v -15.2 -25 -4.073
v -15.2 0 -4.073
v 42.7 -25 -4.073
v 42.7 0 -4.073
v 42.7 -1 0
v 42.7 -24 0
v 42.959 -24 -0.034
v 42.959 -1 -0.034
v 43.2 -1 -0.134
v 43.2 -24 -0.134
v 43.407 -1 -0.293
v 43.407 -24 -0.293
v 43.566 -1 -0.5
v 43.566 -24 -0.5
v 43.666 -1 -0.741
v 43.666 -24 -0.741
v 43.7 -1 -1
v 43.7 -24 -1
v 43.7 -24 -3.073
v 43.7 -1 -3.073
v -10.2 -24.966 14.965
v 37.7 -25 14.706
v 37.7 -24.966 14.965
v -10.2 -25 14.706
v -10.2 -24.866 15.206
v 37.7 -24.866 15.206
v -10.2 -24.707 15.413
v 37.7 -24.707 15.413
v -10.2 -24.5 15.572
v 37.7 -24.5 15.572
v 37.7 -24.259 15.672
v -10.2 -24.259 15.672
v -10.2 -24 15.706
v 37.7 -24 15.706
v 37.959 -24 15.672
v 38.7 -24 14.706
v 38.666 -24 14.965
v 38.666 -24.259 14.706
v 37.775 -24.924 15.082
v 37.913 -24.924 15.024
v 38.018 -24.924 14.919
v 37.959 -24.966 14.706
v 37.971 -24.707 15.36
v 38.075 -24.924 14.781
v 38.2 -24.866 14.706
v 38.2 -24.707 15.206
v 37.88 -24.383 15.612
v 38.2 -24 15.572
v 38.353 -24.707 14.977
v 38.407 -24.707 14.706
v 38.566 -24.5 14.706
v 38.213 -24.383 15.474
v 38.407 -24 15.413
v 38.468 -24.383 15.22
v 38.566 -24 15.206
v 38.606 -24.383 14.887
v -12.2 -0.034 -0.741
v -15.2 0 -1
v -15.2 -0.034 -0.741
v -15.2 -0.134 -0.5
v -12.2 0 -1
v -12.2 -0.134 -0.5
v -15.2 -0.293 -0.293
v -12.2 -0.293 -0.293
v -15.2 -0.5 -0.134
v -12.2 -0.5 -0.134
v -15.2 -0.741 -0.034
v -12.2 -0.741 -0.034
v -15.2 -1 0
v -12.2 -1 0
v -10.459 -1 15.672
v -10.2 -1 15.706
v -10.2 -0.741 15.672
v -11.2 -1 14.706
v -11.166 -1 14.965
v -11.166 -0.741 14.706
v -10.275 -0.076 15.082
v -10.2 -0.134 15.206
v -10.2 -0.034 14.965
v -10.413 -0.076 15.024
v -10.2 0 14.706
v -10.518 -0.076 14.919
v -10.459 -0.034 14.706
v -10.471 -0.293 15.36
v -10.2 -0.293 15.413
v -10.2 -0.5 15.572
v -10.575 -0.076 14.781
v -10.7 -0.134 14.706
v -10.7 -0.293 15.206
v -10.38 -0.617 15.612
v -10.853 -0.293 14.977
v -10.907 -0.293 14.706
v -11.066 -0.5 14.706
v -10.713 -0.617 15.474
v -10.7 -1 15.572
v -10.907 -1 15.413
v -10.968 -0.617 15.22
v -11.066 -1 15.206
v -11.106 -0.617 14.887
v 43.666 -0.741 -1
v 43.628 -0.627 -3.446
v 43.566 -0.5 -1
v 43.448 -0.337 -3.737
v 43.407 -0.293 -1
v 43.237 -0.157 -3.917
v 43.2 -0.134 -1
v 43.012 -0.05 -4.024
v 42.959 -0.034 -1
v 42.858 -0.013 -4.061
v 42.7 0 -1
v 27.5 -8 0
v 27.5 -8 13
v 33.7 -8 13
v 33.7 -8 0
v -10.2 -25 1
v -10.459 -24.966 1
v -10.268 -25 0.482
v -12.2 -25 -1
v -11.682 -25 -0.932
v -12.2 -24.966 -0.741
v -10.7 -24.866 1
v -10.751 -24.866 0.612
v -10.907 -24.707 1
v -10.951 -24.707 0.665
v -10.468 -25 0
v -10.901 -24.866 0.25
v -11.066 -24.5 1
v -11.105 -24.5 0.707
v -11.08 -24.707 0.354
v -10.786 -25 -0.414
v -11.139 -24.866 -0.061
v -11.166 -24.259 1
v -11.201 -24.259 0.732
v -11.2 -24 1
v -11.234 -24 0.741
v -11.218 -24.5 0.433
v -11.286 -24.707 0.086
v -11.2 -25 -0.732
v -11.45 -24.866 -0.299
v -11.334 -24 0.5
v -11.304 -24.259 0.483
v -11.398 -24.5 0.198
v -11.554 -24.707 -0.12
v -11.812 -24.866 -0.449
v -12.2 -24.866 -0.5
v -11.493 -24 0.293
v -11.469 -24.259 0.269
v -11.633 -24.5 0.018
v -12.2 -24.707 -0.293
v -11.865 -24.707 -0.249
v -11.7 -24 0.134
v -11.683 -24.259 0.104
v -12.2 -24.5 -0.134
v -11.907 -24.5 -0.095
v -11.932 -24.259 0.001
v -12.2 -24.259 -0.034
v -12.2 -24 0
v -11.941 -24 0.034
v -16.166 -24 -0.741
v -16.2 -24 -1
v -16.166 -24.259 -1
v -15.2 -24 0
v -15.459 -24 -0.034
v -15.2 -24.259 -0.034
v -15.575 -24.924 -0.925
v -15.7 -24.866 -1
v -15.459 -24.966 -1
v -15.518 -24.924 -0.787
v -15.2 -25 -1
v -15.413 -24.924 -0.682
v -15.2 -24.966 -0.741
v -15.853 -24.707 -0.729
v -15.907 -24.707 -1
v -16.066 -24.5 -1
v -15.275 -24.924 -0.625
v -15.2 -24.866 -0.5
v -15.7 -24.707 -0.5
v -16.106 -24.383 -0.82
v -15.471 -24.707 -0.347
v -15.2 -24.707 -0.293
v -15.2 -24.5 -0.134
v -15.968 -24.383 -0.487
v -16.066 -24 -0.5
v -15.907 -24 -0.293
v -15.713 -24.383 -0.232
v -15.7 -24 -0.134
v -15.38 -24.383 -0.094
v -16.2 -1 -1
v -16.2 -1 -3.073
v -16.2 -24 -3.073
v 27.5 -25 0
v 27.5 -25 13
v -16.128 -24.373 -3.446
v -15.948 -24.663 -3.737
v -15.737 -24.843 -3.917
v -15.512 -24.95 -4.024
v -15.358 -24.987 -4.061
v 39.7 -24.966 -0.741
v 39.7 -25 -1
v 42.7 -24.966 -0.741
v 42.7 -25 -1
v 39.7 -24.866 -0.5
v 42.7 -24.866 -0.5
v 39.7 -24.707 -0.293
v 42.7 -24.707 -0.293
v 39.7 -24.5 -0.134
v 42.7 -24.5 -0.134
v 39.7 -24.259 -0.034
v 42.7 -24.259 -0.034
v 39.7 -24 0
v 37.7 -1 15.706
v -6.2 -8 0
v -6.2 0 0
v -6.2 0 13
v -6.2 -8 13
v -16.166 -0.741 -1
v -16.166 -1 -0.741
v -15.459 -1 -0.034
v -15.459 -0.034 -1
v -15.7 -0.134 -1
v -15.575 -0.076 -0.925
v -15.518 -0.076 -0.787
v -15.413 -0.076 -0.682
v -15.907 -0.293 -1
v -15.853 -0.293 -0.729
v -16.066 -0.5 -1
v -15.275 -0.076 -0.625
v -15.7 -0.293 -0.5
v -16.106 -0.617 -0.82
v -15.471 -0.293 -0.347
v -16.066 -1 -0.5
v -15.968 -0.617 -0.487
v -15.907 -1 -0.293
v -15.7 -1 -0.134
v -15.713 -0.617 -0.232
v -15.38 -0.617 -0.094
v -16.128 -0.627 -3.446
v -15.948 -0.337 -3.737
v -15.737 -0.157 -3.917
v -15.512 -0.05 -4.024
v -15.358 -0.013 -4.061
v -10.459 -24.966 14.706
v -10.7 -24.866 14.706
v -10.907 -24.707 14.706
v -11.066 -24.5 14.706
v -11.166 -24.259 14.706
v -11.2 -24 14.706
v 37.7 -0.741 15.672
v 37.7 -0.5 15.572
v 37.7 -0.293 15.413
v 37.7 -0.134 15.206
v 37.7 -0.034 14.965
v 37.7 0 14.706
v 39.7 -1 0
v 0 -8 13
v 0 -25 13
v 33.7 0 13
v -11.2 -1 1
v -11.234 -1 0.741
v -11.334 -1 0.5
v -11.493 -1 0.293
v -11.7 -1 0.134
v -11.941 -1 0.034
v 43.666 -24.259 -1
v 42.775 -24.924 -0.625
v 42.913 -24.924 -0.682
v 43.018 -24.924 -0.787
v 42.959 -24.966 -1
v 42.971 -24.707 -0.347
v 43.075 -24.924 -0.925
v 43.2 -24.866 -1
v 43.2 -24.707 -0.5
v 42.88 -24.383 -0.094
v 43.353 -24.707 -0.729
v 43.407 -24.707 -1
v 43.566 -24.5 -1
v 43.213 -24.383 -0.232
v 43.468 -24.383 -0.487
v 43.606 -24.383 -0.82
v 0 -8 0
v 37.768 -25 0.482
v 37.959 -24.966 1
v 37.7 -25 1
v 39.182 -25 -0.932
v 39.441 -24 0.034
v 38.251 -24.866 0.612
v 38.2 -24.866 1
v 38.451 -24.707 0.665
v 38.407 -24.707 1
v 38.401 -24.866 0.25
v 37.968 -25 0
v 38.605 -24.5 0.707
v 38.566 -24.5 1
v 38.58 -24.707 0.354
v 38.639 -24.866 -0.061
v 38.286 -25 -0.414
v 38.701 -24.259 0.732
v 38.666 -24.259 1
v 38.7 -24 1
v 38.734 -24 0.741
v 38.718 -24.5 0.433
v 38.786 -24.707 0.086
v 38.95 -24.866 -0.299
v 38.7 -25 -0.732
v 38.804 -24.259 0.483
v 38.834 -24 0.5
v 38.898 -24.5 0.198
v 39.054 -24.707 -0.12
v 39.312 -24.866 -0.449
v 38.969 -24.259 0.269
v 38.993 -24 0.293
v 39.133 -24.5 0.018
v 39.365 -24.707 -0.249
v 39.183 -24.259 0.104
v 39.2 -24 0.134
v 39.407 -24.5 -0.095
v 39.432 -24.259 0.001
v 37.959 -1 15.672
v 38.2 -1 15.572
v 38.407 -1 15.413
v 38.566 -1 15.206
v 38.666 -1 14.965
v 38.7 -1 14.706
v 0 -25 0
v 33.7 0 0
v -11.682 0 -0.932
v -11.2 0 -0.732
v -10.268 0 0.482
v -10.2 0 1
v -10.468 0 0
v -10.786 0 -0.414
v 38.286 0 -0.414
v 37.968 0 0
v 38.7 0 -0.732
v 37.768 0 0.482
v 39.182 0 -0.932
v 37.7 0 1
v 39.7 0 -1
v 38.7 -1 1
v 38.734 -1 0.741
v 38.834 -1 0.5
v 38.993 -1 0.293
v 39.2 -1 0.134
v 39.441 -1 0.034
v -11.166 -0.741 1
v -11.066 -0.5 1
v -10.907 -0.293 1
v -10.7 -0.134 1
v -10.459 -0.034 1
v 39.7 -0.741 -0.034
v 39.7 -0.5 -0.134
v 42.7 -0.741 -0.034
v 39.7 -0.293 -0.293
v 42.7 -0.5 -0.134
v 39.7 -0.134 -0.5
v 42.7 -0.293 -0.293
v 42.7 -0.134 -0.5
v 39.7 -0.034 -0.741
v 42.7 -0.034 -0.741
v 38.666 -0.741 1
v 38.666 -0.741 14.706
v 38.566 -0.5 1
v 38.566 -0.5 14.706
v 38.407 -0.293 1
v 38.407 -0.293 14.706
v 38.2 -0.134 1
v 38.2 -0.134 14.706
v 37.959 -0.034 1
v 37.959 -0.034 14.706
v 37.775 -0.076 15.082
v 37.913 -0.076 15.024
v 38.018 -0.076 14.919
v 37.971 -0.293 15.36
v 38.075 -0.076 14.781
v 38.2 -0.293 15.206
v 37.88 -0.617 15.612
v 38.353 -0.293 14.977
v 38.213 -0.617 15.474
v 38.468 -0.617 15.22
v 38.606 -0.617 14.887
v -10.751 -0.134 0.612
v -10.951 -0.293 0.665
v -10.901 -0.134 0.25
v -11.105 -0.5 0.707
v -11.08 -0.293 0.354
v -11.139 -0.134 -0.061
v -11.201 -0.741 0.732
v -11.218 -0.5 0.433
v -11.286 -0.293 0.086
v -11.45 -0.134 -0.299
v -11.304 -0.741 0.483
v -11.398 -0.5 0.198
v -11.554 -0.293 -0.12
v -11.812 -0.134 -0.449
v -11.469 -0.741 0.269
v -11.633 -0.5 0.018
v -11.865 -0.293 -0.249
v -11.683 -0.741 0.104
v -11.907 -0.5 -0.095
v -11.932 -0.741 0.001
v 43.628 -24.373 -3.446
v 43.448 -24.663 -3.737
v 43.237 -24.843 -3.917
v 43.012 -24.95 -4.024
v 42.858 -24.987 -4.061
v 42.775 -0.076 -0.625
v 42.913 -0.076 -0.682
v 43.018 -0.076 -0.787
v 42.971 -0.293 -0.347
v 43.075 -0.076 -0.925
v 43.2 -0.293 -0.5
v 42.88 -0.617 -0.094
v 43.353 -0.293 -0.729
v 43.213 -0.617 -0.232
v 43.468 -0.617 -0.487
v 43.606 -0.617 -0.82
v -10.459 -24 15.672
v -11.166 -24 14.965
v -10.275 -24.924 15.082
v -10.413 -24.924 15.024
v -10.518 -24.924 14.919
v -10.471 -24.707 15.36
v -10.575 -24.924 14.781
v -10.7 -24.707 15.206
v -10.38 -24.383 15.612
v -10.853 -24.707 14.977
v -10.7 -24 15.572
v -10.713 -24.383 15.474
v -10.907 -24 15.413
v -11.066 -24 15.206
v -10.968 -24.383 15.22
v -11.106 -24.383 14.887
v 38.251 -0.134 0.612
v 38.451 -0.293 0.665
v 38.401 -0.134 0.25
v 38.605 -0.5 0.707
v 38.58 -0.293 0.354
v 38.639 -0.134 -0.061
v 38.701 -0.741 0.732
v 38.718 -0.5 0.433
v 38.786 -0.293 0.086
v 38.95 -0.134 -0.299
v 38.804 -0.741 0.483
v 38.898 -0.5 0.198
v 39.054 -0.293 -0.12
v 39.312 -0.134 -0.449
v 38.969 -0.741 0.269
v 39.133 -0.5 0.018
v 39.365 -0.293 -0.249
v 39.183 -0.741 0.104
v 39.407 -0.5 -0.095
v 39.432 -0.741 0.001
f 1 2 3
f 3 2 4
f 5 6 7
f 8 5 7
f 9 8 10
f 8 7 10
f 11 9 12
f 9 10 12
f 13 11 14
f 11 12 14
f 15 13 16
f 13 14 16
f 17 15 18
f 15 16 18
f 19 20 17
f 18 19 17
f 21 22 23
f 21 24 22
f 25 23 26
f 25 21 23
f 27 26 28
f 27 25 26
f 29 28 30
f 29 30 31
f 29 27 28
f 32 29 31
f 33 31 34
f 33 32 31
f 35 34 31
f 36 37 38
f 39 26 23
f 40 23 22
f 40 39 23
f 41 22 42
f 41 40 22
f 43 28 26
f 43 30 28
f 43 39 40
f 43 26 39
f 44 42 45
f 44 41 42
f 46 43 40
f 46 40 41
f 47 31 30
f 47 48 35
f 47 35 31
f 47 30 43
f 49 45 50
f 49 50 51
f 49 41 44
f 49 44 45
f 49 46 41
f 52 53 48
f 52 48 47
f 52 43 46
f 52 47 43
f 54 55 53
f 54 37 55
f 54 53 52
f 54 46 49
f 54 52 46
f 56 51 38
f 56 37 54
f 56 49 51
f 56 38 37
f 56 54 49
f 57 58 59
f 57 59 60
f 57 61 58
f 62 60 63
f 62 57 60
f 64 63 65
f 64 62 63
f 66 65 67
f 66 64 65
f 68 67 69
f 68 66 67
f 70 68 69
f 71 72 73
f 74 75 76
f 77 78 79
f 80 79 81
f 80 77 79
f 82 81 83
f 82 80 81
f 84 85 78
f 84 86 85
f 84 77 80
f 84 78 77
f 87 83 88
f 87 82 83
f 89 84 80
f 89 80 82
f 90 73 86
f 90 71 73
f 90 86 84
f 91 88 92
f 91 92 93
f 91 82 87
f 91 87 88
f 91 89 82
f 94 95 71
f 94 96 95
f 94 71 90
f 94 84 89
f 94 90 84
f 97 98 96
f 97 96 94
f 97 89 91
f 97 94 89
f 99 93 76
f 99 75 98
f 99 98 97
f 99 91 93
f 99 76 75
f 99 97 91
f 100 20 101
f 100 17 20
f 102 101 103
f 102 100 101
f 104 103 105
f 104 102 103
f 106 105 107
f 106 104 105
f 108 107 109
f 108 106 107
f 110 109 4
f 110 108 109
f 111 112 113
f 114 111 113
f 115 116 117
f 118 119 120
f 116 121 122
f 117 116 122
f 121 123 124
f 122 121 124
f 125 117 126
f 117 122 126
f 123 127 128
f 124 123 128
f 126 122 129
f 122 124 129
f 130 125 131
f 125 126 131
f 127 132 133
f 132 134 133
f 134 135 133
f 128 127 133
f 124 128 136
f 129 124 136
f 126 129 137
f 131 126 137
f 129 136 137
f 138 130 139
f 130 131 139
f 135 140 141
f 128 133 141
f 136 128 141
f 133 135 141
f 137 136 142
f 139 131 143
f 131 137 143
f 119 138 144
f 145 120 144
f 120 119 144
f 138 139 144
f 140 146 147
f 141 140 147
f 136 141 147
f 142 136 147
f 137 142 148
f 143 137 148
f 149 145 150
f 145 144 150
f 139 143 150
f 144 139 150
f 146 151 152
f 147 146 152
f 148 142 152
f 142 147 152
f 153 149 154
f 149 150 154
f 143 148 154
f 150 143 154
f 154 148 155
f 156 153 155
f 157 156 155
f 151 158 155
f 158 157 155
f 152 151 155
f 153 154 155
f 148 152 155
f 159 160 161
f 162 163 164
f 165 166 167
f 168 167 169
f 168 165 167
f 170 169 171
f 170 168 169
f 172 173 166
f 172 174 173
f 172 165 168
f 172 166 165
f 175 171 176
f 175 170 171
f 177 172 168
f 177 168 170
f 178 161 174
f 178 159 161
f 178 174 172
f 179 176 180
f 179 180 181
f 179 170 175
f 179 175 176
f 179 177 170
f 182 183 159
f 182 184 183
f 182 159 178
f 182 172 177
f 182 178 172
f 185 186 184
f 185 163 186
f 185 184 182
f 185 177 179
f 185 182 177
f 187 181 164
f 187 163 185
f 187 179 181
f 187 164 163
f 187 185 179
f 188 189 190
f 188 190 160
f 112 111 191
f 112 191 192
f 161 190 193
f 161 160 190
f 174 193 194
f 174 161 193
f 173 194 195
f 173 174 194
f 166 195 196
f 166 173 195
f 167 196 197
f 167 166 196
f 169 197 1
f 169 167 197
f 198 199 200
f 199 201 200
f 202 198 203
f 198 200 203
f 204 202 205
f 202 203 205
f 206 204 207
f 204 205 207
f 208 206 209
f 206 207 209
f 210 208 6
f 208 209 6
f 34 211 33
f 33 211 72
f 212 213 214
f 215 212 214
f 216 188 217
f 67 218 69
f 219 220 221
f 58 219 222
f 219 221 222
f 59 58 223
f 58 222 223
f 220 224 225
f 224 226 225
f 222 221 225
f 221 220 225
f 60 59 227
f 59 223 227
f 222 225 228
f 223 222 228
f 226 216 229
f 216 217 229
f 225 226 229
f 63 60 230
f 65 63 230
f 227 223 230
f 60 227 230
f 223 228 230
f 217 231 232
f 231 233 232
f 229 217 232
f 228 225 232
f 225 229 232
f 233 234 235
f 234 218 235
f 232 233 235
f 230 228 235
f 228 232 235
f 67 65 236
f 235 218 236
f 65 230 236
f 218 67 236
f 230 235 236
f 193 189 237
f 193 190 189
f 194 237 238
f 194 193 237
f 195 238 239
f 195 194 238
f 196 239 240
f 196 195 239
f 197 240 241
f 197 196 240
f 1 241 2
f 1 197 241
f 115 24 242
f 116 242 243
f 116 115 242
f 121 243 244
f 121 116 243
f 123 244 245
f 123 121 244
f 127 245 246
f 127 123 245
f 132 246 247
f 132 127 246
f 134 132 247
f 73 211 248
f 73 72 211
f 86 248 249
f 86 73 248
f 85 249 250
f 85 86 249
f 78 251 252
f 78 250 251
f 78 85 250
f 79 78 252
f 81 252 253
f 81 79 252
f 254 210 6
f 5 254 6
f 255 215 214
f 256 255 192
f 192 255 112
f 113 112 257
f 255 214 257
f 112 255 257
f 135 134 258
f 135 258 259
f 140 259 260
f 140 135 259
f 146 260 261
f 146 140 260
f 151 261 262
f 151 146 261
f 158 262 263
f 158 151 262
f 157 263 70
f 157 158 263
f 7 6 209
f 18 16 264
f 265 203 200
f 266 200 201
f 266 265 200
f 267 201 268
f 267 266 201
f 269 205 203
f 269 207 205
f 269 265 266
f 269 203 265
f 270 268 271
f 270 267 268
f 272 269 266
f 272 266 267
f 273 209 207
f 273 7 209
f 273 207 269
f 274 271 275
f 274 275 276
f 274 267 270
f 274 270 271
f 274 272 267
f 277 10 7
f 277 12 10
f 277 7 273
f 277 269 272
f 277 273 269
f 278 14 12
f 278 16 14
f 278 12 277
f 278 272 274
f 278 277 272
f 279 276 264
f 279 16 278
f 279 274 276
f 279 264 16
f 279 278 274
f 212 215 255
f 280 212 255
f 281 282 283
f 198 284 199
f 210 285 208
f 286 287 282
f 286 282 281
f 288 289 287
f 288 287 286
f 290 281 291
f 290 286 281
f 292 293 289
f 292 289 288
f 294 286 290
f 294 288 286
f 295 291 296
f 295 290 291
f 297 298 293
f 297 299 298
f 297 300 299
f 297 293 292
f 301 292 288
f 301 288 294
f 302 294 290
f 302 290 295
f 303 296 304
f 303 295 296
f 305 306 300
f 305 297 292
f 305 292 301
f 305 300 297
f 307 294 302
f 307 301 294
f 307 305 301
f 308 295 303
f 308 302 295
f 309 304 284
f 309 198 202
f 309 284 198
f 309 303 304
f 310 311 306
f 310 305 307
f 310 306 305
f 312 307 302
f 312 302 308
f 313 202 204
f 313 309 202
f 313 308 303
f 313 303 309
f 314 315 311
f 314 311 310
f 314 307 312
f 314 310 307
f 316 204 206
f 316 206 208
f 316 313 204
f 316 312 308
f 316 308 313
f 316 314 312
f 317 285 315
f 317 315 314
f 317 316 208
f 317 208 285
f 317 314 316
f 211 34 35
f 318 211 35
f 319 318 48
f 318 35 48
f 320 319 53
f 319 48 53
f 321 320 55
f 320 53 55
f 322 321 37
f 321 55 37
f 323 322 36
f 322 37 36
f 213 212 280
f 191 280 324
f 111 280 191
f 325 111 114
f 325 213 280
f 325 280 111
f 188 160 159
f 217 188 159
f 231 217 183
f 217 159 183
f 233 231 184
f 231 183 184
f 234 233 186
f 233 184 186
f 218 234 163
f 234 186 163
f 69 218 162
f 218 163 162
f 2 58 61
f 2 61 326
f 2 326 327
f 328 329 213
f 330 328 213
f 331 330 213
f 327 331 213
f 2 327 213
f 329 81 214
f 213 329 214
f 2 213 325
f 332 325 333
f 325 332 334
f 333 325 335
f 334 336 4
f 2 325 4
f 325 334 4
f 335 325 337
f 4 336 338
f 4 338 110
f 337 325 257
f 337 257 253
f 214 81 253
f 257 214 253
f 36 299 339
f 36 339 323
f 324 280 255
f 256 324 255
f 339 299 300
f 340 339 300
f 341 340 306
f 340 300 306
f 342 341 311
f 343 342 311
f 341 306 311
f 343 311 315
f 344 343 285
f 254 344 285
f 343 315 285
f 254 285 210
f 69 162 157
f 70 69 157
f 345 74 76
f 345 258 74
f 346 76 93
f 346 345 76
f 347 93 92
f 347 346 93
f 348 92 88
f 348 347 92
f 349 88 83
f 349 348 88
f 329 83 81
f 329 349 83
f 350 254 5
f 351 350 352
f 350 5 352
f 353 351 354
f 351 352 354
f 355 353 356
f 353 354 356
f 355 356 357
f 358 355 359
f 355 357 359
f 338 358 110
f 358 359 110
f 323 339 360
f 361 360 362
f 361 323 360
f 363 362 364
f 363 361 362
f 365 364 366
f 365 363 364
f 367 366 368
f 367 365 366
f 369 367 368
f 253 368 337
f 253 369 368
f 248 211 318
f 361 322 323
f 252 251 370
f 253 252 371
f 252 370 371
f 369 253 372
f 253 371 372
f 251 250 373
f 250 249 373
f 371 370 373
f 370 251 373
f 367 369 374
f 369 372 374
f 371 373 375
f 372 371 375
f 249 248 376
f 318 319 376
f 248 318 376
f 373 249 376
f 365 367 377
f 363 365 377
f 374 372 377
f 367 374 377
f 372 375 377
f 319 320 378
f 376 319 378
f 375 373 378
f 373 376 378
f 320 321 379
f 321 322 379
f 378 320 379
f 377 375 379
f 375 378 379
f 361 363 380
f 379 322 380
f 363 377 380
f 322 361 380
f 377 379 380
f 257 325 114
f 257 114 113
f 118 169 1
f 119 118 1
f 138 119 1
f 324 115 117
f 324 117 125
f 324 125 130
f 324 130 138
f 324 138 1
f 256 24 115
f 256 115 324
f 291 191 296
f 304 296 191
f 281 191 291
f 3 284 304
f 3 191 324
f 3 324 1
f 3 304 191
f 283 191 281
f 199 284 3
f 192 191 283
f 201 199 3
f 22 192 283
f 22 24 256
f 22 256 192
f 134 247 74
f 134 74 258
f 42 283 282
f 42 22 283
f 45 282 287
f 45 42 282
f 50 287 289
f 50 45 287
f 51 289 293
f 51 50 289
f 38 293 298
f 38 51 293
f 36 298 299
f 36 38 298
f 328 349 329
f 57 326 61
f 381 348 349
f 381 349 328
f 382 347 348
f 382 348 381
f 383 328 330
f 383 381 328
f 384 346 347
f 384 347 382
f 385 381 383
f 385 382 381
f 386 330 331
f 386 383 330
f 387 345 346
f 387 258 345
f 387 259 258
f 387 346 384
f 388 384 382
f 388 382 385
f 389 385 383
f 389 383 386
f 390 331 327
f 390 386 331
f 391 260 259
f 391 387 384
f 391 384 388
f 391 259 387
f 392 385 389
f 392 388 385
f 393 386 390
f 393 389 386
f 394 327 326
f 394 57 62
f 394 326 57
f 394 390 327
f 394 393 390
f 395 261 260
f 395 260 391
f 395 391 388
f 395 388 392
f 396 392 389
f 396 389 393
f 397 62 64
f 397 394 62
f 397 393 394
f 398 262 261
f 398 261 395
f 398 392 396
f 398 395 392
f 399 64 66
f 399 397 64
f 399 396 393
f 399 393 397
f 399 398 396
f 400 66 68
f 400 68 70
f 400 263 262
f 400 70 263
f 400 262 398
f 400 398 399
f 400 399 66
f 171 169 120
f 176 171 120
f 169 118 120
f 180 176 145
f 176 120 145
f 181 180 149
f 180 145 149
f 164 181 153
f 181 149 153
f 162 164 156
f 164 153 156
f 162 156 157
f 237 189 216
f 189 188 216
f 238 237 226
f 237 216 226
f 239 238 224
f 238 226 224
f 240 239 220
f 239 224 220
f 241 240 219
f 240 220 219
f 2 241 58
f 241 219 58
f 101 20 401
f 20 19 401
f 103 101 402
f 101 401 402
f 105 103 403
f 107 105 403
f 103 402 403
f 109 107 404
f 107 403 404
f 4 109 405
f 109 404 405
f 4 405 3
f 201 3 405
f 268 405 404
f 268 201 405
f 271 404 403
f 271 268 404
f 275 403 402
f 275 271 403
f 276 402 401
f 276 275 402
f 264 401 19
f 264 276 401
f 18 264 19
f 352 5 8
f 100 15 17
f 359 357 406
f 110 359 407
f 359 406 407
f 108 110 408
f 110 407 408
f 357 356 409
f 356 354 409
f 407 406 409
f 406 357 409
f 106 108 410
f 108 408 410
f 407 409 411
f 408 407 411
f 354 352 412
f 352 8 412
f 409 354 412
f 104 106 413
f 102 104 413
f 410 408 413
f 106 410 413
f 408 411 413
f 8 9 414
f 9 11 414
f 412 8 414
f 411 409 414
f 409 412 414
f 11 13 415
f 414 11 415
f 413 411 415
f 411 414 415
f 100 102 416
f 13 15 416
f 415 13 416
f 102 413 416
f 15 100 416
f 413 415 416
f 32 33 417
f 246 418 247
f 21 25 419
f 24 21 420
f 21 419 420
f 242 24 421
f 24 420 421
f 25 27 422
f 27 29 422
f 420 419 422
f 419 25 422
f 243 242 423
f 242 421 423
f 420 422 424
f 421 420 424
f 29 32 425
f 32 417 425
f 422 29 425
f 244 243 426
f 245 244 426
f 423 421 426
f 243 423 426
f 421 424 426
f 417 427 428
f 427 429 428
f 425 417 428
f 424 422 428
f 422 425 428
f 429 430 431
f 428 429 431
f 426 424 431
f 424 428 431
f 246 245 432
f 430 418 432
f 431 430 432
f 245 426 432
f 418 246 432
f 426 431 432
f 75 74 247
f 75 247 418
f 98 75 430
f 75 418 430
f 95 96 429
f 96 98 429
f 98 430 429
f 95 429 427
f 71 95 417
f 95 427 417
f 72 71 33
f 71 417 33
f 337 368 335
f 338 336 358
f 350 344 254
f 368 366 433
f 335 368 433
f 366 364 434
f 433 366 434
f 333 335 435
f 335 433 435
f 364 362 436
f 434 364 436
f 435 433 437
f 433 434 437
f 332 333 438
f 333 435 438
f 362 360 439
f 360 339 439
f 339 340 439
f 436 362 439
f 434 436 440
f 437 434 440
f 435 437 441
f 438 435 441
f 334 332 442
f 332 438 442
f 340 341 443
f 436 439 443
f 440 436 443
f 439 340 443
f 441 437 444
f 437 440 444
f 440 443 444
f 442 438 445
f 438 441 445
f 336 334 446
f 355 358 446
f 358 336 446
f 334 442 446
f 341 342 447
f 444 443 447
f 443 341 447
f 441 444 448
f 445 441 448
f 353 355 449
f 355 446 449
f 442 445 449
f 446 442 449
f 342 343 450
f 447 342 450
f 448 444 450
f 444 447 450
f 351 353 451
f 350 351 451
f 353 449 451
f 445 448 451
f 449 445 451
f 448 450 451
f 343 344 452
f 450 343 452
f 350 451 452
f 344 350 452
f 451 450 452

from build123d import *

# Parameters (mm, degrees)
F0_W     = 5
F0_H     = 4.0733553469
F0_W_2   = 6.2
F0_H_2   = 13
F1_DEPTH = 25
F2_DEPTH = 8
F3_R     = 1


with BuildPart() as f1:
    # F0 (on Front) → F1 (new body)
    with BuildSketch(Plane.XZ):
        with Locations((-13.7, -2.0366776735)):
            Rectangle(F0_W, F0_H)
        Polygon((38.7, 15.7062858343), (-11.2, 15.7062858343), (-11.2, 0), (-11.2, -4.0733553469), (38.7, -4.0733553469), (38.7, 0), align=None)
        Polygon((27.5, 0), (0, 0), (-6.2, 0), (-6.2, 13), (0, 13), (27.5, 13), (33.7, 13), (33.7, 0), align=None, mode=Mode.SUBTRACT)
        with Locations((41.2, -2.0366776735)):
            Rectangle(F0_W, F0_H)
        with Locations((-3.1, 6.5)):
            Rectangle(F0_W_2, F0_H_2)
        with Locations((30.6, 6.5)):
            Rectangle(F0_W_2, F0_H_2)
    extrude(amount=F1_DEPTH)

    # F0 (on Front) → F2 (cut)
    with BuildSketch(Plane.XZ):
        with Locations((30.6, 6.5)):
            Rectangle(F0_W_2, F0_H_2)
        with Locations((-3.1, 6.5)):
            Rectangle(F0_W_2, F0_H_2)
    extrude(amount=F2_DEPTH, mode=Mode.SUBTRACT)

    # F3
    f3_edges = [f1.edges().sort_by_distance(p)[0] for p in [
        (38.7, -12.5, 15.706286),
        (-11.2, -12.5, 15.706286),
        (13.75, 0, 15.706286),
        (13.75, -25, 15.706286),
        (38.7, -12.5, 0),
        (38.7, 0, 7.853143),
        (38.7, -25, 7.853143),
        (43.7, -12.5, 0),
        (41.2, 0, 0),
        (41.2, -25, 0),
        (43.7, -12.5, -4.073355),
        (43.7, 0, -2.036678),
        (43.7, -25, -2.036678),
        (-11.2, -12.5, 0),
        (-11.2, 0, 7.853143),
        (-11.2, -25, 7.853143),
        (-16.2, -12.5, 0),
        (-16.2, -12.5, -4.073355),
        (-16.2, 0, -2.036678),
        (-16.2, -25, -2.036678),
        (-13.7, 0, 0),
        (-13.7, -25, 0),
    ]]
    fillet(f3_edges, radius=F3_R)


solid = f1.part
